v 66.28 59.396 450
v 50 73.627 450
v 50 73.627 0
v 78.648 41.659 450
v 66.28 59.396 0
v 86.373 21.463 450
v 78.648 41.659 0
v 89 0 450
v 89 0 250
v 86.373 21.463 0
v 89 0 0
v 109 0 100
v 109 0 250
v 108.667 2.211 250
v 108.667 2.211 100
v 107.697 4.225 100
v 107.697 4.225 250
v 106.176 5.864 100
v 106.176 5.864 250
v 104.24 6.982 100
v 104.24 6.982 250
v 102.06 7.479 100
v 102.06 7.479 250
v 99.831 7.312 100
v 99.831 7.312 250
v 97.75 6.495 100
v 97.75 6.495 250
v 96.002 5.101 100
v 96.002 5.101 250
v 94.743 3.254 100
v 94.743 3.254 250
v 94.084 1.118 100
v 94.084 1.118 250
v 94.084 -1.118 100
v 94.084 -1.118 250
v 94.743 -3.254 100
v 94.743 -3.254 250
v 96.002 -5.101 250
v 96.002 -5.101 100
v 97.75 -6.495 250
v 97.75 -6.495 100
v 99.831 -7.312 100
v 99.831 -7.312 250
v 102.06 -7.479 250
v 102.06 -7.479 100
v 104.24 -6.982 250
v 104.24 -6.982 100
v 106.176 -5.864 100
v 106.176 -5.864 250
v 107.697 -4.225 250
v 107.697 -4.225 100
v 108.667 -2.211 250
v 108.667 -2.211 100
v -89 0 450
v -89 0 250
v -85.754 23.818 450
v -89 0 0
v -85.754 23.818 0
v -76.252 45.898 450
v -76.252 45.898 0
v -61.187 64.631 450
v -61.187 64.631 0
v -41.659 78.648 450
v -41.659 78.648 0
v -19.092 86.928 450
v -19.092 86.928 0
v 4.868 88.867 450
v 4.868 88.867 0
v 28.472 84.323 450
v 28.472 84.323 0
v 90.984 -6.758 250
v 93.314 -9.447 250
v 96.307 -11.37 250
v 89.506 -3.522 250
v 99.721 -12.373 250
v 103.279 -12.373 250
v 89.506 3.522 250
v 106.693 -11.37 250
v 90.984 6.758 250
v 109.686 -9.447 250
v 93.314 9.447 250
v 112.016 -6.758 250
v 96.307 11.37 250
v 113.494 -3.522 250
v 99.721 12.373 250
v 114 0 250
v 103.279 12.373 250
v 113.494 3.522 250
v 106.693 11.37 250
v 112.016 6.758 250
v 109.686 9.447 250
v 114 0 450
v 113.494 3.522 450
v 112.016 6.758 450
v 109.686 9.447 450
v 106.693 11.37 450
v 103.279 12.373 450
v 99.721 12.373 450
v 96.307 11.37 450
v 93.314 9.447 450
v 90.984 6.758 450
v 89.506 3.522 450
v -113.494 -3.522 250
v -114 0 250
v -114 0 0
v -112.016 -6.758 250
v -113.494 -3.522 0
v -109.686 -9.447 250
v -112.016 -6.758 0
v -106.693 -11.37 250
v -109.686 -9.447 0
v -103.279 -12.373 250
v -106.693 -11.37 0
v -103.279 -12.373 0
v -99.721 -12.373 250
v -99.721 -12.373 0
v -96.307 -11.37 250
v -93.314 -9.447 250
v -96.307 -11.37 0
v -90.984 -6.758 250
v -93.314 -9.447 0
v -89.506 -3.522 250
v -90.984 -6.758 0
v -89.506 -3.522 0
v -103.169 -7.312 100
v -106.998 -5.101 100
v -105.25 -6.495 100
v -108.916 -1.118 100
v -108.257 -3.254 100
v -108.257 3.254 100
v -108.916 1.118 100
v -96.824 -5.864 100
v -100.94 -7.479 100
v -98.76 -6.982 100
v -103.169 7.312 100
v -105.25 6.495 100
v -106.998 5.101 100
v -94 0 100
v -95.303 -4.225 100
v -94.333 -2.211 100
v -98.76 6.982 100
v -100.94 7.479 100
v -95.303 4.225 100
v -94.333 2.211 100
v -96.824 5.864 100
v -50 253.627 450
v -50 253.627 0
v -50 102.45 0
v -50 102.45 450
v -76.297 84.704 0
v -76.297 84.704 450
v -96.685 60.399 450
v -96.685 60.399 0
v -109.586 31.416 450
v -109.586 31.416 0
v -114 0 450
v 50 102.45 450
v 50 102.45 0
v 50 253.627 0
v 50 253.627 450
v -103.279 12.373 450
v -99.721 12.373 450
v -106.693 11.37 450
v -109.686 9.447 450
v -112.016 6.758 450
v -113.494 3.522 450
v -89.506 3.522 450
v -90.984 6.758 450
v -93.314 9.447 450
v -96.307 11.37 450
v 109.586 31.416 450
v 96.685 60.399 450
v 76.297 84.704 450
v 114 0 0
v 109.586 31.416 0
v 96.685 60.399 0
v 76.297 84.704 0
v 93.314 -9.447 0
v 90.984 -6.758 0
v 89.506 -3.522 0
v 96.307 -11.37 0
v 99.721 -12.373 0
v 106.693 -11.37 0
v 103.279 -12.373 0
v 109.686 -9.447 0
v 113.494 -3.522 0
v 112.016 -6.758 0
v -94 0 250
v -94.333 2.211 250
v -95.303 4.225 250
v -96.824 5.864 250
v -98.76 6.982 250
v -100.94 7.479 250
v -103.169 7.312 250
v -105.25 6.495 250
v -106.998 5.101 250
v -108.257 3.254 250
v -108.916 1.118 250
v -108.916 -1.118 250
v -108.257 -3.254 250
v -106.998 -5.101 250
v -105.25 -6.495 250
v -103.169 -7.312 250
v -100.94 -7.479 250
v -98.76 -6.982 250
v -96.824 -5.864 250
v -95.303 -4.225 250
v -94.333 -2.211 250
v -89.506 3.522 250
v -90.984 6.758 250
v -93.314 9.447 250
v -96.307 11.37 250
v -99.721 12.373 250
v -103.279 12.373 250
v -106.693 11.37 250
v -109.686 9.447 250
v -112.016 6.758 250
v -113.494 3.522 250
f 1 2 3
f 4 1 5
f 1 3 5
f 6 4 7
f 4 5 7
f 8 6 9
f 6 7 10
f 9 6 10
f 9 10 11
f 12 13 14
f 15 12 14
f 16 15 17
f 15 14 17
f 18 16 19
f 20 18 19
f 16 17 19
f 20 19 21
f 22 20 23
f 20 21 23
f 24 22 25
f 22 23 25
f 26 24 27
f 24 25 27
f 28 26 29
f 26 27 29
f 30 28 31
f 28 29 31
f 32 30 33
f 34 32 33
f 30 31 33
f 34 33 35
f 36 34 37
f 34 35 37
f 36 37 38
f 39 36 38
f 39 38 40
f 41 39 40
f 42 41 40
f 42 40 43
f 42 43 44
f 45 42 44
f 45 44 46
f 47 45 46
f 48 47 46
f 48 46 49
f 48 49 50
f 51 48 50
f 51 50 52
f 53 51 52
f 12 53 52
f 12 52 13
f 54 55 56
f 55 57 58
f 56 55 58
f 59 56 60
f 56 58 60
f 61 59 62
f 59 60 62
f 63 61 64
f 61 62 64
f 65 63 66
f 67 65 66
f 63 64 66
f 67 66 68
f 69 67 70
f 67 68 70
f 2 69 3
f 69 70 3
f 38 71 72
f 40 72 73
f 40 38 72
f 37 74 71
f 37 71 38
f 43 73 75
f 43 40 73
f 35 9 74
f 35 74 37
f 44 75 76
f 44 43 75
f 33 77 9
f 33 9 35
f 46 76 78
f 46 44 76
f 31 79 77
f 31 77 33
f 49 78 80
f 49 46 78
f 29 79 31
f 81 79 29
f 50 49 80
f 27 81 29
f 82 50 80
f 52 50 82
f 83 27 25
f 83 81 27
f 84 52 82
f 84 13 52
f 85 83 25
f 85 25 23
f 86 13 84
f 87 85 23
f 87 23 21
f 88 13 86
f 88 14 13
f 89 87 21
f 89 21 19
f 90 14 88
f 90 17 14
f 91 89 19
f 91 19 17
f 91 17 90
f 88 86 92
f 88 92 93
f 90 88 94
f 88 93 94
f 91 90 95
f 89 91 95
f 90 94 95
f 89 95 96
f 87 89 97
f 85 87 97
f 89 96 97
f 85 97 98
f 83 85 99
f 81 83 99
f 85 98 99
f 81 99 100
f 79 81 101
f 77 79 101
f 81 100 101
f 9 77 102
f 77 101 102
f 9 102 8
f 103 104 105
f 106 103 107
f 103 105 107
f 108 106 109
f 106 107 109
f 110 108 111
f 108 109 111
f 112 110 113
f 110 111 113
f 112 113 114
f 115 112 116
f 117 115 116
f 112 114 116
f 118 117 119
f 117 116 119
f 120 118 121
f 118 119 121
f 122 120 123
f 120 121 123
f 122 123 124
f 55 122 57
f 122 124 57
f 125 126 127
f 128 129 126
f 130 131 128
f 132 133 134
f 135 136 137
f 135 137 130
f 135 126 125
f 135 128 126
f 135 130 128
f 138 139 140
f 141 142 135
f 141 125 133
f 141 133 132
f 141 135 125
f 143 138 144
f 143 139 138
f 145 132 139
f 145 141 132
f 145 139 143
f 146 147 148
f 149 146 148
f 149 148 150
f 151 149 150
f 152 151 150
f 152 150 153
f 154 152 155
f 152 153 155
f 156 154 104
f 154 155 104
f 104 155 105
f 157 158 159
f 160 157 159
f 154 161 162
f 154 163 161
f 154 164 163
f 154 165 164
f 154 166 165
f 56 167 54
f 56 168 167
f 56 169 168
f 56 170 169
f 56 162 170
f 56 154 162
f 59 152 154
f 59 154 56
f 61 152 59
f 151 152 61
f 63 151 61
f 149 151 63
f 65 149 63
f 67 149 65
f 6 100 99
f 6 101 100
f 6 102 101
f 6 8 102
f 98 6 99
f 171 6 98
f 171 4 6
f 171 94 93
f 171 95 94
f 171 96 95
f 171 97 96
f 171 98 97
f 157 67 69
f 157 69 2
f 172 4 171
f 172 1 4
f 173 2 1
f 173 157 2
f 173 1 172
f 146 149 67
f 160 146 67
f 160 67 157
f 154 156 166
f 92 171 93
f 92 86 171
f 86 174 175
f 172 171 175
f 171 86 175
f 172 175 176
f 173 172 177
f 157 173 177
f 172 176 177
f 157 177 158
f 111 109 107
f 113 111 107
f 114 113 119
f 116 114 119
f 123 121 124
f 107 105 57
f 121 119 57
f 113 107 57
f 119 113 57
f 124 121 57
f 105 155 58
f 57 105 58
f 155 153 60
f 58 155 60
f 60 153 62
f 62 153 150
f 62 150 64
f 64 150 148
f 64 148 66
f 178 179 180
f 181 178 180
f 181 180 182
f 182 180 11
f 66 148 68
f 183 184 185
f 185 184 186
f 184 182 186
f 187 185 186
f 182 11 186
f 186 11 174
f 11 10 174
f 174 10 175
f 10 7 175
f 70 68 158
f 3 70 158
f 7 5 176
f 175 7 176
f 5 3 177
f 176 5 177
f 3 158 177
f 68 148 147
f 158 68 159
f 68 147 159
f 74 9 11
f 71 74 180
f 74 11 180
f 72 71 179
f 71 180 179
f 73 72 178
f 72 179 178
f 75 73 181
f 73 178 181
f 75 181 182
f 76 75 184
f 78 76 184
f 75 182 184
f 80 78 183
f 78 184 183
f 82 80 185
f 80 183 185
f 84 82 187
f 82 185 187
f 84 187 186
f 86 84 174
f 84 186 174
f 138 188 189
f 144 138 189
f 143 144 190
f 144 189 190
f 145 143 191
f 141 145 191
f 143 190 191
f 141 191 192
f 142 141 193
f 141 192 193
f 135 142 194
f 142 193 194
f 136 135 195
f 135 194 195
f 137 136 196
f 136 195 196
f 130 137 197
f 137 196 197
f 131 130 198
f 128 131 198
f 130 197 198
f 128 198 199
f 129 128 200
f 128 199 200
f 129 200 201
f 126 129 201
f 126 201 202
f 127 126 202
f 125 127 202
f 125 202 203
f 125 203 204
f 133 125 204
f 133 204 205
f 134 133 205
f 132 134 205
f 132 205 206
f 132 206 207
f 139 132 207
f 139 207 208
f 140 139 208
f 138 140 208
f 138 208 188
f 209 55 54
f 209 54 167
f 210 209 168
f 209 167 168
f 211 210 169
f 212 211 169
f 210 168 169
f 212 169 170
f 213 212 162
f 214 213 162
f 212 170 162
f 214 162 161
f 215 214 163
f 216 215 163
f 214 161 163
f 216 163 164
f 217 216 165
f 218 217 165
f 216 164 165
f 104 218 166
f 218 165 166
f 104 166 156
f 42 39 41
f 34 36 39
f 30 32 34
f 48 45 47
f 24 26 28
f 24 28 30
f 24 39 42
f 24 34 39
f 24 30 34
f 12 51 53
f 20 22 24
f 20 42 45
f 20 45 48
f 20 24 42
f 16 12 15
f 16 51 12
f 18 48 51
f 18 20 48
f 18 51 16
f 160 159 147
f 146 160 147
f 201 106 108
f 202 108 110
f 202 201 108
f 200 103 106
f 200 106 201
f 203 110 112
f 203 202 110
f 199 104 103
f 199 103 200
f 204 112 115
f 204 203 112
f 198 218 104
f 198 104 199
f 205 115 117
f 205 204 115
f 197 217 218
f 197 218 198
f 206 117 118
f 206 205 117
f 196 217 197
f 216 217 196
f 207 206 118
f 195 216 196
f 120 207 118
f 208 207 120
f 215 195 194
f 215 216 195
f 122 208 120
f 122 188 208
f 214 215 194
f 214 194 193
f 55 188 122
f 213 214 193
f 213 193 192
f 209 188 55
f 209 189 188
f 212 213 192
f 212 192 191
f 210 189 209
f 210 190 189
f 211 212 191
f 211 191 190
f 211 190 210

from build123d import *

# Parameters (mm, degrees)
BOSS_EXTRU_1_DEPTH      = 450
ESQUISSE2_R             = 7.5
ENL_V_MAT_EXTRU_1_DEPTH = 350
ESQUISSE2_3_R           = 12.5
ESQUISSE2_3_R_2         = 7.5
ENL_V_MAT_EXTRU_2_DEPTH = 200


with BuildPart() as part:
    # Esquisse1 → Boss.-Extru.1 (new body)
    with BuildSketch(Plane.XY):
        with BuildLine():
            ThreePointArc((-89, 0), (0, 89), (89, 0))
            ThreePointArc((89, 0), (101.5, -12.5), (114, 0))
            ThreePointArc((114, 0), (96.685055722, 60.398675482), (50, 102.449987799))
            Line((50, 102.449987799), (50, 253.627440537))
            Line((50, 253.627440537), (-50, 253.627440537))
            Line((-50, 253.627440537), (-50, 102.449987799))
            ThreePointArc((-50, 102.449987799), (-96.685055722, 60.398675482), (-114, 0))
            ThreePointArc((-114, 0), (-101.5, -12.5), (-89, 0))
        make_face()
    extrude(amount=BOSS_EXTRU_1_DEPTH)

    # Esquisse2 → Enlèv. mat.-Extru.1 (cut)
    with BuildSketch(Plane.XY.offset(450)):
        with Locations((101.5, 0)):
            Circle(ESQUISSE2_R)
        with Locations((-101.5, 0)):
            Circle(ESQUISSE2_R)
    extrude(amount=-ENL_V_MAT_EXTRU_1_DEPTH, mode=Mode.SUBTRACT)

    # Esquisse2<3> → Enlèv. mat.-Extru.2 (cut)
    # profile 1 of 2: a face of its own
    with BuildSketch(Plane.XY.offset(450)):
        with Locations((-101.5, 0)):
            Circle(ESQUISSE2_3_R)
        with Locations((-101.5, 0)):
            Circle(ESQUISSE2_3_R_2, mode=Mode.SUBTRACT)
    # profile 2 of 2: a face of its own
    with BuildSketch(Plane.XY.offset(450)):
        with Locations((101.5, 0)):
            Circle(ESQUISSE2_3_R)
        with Locations((101.5, 0)):
            Circle(ESQUISSE2_3_R_2, mode=Mode.SUBTRACT)
    extrude(amount=-ENL_V_MAT_EXTRU_2_DEPTH, mode=Mode.SUBTRACT)


solid = part.part
